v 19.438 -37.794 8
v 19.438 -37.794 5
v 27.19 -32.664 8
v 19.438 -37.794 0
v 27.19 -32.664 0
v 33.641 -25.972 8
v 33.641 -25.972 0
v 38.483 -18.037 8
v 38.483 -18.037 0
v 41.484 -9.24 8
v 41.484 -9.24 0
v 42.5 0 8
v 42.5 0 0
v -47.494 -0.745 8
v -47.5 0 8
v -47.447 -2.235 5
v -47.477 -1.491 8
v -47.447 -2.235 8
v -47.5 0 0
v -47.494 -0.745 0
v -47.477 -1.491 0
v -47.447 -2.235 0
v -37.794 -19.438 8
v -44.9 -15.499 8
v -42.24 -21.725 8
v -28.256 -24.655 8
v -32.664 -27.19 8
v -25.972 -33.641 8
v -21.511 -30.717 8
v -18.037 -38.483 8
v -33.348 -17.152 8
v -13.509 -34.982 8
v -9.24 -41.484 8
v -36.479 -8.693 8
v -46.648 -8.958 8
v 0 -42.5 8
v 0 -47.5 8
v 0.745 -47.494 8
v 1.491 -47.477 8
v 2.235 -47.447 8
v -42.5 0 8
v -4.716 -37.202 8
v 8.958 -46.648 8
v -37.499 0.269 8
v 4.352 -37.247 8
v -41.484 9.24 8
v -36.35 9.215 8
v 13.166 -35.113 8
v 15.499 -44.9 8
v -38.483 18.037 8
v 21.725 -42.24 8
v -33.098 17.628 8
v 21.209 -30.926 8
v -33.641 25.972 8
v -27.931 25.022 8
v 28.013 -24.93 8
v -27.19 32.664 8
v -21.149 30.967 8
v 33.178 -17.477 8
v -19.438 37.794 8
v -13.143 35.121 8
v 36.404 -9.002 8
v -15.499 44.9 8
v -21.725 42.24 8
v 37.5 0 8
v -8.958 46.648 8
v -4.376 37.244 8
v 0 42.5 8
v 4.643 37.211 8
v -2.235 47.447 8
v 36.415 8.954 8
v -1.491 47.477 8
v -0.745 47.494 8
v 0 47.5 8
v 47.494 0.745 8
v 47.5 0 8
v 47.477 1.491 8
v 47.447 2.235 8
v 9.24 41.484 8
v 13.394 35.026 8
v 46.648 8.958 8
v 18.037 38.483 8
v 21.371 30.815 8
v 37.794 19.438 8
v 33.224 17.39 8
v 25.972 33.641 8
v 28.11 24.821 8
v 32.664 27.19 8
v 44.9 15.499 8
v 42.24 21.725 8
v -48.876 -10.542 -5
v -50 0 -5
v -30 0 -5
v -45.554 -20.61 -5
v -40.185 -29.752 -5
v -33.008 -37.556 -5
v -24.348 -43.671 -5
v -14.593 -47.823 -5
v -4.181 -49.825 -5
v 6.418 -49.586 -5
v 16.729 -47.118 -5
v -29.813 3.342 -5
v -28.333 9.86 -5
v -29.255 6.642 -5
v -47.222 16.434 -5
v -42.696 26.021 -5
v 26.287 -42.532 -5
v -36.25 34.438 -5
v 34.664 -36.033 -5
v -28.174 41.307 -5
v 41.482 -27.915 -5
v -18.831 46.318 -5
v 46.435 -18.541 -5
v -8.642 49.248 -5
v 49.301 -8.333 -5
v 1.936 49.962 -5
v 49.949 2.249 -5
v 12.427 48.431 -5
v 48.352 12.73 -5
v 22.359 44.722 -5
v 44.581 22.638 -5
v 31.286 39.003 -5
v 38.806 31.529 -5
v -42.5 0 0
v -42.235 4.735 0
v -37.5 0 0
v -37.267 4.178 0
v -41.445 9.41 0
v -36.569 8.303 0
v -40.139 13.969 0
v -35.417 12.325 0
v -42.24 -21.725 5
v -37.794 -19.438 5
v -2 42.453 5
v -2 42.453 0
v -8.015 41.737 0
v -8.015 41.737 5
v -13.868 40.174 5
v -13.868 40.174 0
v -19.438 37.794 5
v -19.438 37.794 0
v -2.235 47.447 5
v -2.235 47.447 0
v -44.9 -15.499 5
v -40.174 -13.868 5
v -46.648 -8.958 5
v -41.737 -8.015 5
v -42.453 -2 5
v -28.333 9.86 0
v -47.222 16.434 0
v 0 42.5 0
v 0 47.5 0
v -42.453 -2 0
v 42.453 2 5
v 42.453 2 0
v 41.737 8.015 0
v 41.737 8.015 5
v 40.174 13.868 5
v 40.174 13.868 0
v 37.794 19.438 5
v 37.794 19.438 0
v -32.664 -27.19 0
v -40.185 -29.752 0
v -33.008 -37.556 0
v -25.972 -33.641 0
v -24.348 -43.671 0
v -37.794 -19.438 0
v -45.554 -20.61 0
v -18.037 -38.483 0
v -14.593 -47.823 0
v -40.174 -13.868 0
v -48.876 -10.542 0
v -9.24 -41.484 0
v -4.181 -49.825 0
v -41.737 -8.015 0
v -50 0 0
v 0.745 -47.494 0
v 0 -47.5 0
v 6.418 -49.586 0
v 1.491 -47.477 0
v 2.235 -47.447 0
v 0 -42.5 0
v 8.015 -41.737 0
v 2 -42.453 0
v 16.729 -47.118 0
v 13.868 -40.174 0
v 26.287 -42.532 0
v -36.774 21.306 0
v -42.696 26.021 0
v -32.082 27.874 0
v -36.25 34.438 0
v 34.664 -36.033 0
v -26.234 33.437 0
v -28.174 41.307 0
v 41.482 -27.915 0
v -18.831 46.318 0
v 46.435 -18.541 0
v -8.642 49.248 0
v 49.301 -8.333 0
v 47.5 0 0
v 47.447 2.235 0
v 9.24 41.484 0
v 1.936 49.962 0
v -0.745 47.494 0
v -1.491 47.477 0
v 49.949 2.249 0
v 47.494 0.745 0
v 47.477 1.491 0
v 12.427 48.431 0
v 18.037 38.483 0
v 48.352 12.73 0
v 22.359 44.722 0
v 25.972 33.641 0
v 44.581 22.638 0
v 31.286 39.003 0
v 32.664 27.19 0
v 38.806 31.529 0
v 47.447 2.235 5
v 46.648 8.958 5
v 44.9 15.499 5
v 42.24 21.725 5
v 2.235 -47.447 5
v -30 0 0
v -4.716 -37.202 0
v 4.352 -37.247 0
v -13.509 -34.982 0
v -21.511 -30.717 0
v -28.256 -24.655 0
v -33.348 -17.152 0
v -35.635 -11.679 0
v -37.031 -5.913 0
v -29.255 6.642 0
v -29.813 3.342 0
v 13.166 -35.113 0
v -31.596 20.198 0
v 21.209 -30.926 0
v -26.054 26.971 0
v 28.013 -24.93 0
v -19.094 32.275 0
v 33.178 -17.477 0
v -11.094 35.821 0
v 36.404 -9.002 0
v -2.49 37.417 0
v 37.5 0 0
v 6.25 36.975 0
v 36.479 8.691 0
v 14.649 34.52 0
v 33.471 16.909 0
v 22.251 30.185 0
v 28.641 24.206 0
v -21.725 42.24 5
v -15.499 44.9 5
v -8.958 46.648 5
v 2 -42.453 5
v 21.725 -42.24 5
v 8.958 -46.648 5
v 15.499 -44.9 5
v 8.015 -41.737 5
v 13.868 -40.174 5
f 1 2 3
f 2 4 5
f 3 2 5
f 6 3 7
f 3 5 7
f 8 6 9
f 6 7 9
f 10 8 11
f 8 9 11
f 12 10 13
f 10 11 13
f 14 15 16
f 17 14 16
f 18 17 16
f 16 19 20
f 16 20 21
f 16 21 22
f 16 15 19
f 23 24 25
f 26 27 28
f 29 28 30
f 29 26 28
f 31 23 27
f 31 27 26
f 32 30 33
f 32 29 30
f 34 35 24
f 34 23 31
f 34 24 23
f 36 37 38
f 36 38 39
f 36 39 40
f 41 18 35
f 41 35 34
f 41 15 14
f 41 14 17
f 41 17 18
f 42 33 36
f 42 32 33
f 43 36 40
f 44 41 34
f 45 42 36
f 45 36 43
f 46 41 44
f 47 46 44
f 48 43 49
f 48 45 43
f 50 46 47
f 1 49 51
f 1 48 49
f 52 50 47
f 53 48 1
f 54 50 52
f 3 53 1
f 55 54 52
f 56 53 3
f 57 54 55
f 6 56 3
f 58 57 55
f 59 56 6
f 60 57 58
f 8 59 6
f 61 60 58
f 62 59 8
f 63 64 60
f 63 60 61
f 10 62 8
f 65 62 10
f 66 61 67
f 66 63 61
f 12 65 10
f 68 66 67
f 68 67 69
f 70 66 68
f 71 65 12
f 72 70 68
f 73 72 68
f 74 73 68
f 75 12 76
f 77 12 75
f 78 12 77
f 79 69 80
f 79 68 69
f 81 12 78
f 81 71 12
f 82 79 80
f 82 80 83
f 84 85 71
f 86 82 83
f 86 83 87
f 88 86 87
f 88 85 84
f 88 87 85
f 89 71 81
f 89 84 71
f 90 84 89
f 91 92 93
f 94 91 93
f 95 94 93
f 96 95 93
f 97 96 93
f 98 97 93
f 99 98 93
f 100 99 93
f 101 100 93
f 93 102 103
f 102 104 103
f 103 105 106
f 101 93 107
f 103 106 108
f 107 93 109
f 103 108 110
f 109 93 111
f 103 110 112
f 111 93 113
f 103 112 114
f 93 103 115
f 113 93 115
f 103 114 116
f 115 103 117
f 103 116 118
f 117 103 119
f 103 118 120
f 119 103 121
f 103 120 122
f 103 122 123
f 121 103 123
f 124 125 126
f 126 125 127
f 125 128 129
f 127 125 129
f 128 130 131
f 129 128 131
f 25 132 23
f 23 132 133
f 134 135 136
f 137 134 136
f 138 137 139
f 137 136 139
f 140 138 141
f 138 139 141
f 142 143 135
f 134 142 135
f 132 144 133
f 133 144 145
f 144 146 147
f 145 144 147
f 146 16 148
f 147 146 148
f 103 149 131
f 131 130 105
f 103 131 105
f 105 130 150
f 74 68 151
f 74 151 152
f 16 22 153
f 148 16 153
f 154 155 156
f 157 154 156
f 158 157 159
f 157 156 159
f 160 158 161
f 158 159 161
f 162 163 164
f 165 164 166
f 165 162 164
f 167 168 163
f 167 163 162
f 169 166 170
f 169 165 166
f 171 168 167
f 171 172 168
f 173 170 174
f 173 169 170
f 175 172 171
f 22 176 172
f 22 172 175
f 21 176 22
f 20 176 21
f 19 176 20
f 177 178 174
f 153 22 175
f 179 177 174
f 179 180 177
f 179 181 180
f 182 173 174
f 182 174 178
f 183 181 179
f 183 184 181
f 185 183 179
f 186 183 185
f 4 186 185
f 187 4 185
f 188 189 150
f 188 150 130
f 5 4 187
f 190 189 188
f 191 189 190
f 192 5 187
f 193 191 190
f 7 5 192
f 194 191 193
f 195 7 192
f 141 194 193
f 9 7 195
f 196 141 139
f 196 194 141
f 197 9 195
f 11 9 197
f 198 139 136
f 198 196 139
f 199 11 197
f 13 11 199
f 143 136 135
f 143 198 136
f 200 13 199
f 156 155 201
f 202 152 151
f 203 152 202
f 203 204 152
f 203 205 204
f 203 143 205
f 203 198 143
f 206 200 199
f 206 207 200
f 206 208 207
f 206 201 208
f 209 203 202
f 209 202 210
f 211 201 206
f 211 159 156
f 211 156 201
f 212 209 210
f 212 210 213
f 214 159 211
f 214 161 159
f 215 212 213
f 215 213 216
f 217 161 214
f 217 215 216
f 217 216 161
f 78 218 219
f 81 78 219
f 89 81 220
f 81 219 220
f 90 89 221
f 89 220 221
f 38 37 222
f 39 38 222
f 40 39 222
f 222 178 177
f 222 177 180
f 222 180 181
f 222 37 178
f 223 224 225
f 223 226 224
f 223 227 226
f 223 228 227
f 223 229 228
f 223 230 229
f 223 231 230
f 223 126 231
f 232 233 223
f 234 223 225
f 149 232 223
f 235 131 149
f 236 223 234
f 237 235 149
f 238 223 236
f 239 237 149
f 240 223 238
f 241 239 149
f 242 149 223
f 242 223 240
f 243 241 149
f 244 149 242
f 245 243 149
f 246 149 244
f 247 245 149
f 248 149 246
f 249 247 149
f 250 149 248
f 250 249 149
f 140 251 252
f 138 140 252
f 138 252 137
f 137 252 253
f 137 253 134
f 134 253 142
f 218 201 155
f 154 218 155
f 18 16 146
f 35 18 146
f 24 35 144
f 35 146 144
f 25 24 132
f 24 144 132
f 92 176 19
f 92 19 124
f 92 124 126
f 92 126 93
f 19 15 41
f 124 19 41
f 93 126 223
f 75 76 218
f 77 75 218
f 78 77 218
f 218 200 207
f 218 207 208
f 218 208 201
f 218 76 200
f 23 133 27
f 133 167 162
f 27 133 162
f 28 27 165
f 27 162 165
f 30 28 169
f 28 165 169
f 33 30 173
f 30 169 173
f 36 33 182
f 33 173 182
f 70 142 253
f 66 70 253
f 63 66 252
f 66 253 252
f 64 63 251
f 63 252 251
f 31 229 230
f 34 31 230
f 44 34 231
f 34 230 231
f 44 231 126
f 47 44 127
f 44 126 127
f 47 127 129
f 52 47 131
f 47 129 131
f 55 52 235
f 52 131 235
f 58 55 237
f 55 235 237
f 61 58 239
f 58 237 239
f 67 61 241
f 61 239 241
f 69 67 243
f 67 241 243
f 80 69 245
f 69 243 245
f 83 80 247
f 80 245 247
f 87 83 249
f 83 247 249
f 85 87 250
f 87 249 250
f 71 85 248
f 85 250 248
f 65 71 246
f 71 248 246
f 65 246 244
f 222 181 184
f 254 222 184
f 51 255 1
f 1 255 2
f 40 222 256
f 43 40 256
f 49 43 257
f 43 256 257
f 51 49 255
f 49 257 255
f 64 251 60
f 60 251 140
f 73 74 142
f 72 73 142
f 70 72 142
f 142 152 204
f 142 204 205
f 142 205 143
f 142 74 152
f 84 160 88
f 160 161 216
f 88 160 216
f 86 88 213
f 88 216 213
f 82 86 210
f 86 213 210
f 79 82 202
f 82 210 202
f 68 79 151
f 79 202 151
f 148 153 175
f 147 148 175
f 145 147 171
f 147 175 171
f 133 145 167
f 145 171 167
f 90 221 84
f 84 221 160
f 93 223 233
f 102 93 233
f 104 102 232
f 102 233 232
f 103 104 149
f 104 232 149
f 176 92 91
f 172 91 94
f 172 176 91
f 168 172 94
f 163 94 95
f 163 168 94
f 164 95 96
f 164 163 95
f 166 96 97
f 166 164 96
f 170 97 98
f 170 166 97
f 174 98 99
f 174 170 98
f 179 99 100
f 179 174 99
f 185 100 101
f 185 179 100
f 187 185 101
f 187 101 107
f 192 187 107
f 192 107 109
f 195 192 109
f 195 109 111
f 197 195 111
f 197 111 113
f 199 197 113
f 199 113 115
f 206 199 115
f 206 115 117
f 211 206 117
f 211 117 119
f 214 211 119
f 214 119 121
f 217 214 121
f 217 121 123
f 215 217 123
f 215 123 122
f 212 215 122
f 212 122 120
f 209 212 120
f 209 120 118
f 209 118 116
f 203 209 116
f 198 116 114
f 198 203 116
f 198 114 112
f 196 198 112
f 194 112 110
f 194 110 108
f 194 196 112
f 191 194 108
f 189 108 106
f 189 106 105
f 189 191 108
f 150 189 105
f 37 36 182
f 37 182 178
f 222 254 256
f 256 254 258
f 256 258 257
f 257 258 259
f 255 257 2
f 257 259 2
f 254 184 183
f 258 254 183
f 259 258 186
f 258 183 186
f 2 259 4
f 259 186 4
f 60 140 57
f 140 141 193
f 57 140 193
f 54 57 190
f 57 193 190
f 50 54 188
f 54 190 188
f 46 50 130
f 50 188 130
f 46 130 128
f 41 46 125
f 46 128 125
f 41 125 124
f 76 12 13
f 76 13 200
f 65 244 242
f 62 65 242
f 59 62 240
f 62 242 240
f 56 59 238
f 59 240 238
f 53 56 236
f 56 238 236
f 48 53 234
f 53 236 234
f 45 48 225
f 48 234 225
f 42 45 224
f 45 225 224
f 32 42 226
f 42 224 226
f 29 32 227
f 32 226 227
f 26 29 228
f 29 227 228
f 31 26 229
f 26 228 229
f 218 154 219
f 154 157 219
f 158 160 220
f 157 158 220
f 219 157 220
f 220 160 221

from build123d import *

# Parameters (mm, degrees)
F1_DEPTH = 8
F2_DEPTH = 8
F3_START = 5
F3_DEPTH = 3
F4_R     = 50
F5_DEPTH = 5
F7_DEPTH = 5


with BuildPart() as f1:
    # F0 (on Top) → F1 (new body)
    with BuildSketch(Plane.XY):
        with BuildLine():
            ThreePointArc((19.4384842845, -37.7941176471), (36.2793714257, -22.137235802), (42.5, 0))
            ThreePointArc((42.5, 0), (42.488227143, 1.0002770852), (42.4529150943, 2))
            ThreePointArc((42.4529150943, 2), (41.0599774657, 10.969423436), (37.7941176471, 19.4384842845))
            ThreePointArc((37.7941176471, 19.4384842845), (22.137235802, 36.2793714257), (0, 42.5))
            ThreePointArc((0, 42.5), (-1.0002770852, 42.488227143), (-2, 42.4529150943))
            ThreePointArc((-2, 42.4529150943), (-10.969423436, 41.0599774657), (-19.4384842845, 37.7941176471))
            ThreePointArc((-19.4384842845, 37.7941176471), (-36.2793714257, 22.137235802), (-42.5, 0))
            ThreePointArc((-42.5, 0), (-42.488227143, -1.0002770852), (-42.4529150943, -2))
            ThreePointArc((-42.4529150943, -2), (-41.0599774657, -10.969423436), (-37.7941176471, -19.4384842845))
            ThreePointArc((-37.7941176471, -19.4384842845), (-22.137235802, -36.2793714257), (0, -42.5))
            ThreePointArc((0, -42.5), (1.0002770852, -42.488227143), (2, -42.4529150943))
            ThreePointArc((2, -42.4529150943), (10.969423436, -41.0599774657), (19.4384842845, -37.7941176471))
        make_face()
        with BuildLine():
            ThreePointArc((37.5, 0), (8.8235294118, -36.4471580335), (-33.3477508651, -17.1516037805))
            ThreePointArc((-33.3477508651, -17.1516037805), (-8.8235294118, 36.4471580335), (37.5, 0))
        make_face(mode=Mode.SUBTRACT)
    extrude(amount=F1_DEPTH)

    # F0 (on Top) → F2 (join)
    with BuildSketch(Plane.XY):
        with BuildLine():
            ThreePointArc((-47.5, 0), (-47.486842101, -1.1179567422), (-47.4473756936, -2.2352941176))
            Line((-47.4473756936, -2.2352941176), (-42.4529150943, -2))
            ThreePointArc((-42.4529150943, -2), (-42.488227143, -1.0002770852), (-42.5, 0))
            Line((-42.5, 0), (-47.5, 0))
        make_face()
        with BuildLine():
            Line((0, 42.5), (0, 47.5))
            ThreePointArc((0, 47.5), (-1.1179567422, 47.486842101), (-2.2352941176, 47.4473756936))
            Line((-2.2352941176, 47.4473756936), (-2, 42.4529150943))
            ThreePointArc((-2, 42.4529150943), (-1.0002770852, 42.488227143), (0, 42.5))
        make_face()
        with BuildLine():
            Line((42.5, 0), (47.5, 0))
            ThreePointArc((47.5, 0), (47.486842101, 1.1179567422), (47.4473756936, 2.2352941176))
            Line((47.4473756936, 2.2352941176), (42.4529150943, 2))
            ThreePointArc((42.4529150943, 2), (42.488227143, 1.0002770852), (42.5, 0))
        make_face()
        with BuildLine():
            ThreePointArc((0, -47.5), (1.1179567422, -47.486842101), (2.2352941176, -47.4473756936))
            Line((2.2352941176, -47.4473756936), (2, -42.4529150943))
            ThreePointArc((2, -42.4529150943), (1.0002770852, -42.488227143), (0, -42.5))
            Line((0, -42.5), (0, -47.5))
        make_face()
    extrude(amount=F2_DEPTH)

    # F0 (on Top) → F3 (join)
    with BuildSketch(Plane.XY.offset(F3_START)):
        with BuildLine():
            ThreePointArc((-47.4473756936, -2.2352941176), (-45.8905630499, -12.2599438402), (-42.2404844291, -21.7253647886))
            Line((-42.2404844291, -21.7253647886), (-37.7941176471, -19.4384842845))
            ThreePointArc((-37.7941176471, -19.4384842845), (-41.0599774657, -10.969423436), (-42.4529150943, -2))
            Line((-42.4529150943, -2), (-47.4473756936, -2.2352941176))
        make_face()
        with BuildLine():
            ThreePointArc((2.2352941176, -47.4473756936), (12.2599438402, -45.8905630499), (21.7253647886, -42.2404844291))
            Line((21.7253647886, -42.2404844291), (19.4384842845, -37.7941176471))
            ThreePointArc((19.4384842845, -37.7941176471), (10.969423436, -41.0599774657), (2, -42.4529150943))
            Line((2, -42.4529150943), (2.2352941176, -47.4473756936))
        make_face()
        with BuildLine():
            Line((42.4529150943, 2), (47.4473756936, 2.2352941176))
            ThreePointArc((47.4473756936, 2.2352941176), (45.8905630499, 12.2599438402), (42.2404844291, 21.7253647886))
            Line((42.2404844291, 21.7253647886), (37.7941176471, 19.4384842845))
            ThreePointArc((37.7941176471, 19.4384842845), (41.0599774657, 10.969423436), (42.4529150943, 2))
        make_face()
        with BuildLine():
            Line((-2, 42.4529150943), (-2.2352941176, 47.4473756936))
            ThreePointArc((-2.2352941176, 47.4473756936), (-12.2599438402, 45.8905630499), (-21.7253647886, 42.2404844291))
            Line((-21.7253647886, 42.2404844291), (-19.4384842845, 37.7941176471))
            ThreePointArc((-19.4384842845, 37.7941176471), (-10.969423436, 41.0599774657), (-2, 42.4529150943))
        make_face()
    extrude(amount=F3_DEPTH)

    # F4 (on Top) → F5 (join)
    with BuildSketch(Plane.XY):
        Circle(F4_R)
    extrude(amount=-F5_DEPTH)

    # F6 (on Top) → F7 (cut)
    with BuildSketch(Plane.XY):
        with BuildLine():
            Line((-28.3333333333, 9.8601329718), (-47.2222222222, 16.4335549531))
            ThreePointArc((-47.2222222222, 16.4335549531), (-49.3006648592, 8.3333333333), (-50, 0))
            Line((-50, 0), (-30, 0))
            ThreePointArc((-30, 0), (-29.5803989155, 5), (-28.3333333333, 9.8601329718))
        make_face()
    extrude(amount=-F7_DEPTH, mode=Mode.SUBTRACT)


solid = f1.part
